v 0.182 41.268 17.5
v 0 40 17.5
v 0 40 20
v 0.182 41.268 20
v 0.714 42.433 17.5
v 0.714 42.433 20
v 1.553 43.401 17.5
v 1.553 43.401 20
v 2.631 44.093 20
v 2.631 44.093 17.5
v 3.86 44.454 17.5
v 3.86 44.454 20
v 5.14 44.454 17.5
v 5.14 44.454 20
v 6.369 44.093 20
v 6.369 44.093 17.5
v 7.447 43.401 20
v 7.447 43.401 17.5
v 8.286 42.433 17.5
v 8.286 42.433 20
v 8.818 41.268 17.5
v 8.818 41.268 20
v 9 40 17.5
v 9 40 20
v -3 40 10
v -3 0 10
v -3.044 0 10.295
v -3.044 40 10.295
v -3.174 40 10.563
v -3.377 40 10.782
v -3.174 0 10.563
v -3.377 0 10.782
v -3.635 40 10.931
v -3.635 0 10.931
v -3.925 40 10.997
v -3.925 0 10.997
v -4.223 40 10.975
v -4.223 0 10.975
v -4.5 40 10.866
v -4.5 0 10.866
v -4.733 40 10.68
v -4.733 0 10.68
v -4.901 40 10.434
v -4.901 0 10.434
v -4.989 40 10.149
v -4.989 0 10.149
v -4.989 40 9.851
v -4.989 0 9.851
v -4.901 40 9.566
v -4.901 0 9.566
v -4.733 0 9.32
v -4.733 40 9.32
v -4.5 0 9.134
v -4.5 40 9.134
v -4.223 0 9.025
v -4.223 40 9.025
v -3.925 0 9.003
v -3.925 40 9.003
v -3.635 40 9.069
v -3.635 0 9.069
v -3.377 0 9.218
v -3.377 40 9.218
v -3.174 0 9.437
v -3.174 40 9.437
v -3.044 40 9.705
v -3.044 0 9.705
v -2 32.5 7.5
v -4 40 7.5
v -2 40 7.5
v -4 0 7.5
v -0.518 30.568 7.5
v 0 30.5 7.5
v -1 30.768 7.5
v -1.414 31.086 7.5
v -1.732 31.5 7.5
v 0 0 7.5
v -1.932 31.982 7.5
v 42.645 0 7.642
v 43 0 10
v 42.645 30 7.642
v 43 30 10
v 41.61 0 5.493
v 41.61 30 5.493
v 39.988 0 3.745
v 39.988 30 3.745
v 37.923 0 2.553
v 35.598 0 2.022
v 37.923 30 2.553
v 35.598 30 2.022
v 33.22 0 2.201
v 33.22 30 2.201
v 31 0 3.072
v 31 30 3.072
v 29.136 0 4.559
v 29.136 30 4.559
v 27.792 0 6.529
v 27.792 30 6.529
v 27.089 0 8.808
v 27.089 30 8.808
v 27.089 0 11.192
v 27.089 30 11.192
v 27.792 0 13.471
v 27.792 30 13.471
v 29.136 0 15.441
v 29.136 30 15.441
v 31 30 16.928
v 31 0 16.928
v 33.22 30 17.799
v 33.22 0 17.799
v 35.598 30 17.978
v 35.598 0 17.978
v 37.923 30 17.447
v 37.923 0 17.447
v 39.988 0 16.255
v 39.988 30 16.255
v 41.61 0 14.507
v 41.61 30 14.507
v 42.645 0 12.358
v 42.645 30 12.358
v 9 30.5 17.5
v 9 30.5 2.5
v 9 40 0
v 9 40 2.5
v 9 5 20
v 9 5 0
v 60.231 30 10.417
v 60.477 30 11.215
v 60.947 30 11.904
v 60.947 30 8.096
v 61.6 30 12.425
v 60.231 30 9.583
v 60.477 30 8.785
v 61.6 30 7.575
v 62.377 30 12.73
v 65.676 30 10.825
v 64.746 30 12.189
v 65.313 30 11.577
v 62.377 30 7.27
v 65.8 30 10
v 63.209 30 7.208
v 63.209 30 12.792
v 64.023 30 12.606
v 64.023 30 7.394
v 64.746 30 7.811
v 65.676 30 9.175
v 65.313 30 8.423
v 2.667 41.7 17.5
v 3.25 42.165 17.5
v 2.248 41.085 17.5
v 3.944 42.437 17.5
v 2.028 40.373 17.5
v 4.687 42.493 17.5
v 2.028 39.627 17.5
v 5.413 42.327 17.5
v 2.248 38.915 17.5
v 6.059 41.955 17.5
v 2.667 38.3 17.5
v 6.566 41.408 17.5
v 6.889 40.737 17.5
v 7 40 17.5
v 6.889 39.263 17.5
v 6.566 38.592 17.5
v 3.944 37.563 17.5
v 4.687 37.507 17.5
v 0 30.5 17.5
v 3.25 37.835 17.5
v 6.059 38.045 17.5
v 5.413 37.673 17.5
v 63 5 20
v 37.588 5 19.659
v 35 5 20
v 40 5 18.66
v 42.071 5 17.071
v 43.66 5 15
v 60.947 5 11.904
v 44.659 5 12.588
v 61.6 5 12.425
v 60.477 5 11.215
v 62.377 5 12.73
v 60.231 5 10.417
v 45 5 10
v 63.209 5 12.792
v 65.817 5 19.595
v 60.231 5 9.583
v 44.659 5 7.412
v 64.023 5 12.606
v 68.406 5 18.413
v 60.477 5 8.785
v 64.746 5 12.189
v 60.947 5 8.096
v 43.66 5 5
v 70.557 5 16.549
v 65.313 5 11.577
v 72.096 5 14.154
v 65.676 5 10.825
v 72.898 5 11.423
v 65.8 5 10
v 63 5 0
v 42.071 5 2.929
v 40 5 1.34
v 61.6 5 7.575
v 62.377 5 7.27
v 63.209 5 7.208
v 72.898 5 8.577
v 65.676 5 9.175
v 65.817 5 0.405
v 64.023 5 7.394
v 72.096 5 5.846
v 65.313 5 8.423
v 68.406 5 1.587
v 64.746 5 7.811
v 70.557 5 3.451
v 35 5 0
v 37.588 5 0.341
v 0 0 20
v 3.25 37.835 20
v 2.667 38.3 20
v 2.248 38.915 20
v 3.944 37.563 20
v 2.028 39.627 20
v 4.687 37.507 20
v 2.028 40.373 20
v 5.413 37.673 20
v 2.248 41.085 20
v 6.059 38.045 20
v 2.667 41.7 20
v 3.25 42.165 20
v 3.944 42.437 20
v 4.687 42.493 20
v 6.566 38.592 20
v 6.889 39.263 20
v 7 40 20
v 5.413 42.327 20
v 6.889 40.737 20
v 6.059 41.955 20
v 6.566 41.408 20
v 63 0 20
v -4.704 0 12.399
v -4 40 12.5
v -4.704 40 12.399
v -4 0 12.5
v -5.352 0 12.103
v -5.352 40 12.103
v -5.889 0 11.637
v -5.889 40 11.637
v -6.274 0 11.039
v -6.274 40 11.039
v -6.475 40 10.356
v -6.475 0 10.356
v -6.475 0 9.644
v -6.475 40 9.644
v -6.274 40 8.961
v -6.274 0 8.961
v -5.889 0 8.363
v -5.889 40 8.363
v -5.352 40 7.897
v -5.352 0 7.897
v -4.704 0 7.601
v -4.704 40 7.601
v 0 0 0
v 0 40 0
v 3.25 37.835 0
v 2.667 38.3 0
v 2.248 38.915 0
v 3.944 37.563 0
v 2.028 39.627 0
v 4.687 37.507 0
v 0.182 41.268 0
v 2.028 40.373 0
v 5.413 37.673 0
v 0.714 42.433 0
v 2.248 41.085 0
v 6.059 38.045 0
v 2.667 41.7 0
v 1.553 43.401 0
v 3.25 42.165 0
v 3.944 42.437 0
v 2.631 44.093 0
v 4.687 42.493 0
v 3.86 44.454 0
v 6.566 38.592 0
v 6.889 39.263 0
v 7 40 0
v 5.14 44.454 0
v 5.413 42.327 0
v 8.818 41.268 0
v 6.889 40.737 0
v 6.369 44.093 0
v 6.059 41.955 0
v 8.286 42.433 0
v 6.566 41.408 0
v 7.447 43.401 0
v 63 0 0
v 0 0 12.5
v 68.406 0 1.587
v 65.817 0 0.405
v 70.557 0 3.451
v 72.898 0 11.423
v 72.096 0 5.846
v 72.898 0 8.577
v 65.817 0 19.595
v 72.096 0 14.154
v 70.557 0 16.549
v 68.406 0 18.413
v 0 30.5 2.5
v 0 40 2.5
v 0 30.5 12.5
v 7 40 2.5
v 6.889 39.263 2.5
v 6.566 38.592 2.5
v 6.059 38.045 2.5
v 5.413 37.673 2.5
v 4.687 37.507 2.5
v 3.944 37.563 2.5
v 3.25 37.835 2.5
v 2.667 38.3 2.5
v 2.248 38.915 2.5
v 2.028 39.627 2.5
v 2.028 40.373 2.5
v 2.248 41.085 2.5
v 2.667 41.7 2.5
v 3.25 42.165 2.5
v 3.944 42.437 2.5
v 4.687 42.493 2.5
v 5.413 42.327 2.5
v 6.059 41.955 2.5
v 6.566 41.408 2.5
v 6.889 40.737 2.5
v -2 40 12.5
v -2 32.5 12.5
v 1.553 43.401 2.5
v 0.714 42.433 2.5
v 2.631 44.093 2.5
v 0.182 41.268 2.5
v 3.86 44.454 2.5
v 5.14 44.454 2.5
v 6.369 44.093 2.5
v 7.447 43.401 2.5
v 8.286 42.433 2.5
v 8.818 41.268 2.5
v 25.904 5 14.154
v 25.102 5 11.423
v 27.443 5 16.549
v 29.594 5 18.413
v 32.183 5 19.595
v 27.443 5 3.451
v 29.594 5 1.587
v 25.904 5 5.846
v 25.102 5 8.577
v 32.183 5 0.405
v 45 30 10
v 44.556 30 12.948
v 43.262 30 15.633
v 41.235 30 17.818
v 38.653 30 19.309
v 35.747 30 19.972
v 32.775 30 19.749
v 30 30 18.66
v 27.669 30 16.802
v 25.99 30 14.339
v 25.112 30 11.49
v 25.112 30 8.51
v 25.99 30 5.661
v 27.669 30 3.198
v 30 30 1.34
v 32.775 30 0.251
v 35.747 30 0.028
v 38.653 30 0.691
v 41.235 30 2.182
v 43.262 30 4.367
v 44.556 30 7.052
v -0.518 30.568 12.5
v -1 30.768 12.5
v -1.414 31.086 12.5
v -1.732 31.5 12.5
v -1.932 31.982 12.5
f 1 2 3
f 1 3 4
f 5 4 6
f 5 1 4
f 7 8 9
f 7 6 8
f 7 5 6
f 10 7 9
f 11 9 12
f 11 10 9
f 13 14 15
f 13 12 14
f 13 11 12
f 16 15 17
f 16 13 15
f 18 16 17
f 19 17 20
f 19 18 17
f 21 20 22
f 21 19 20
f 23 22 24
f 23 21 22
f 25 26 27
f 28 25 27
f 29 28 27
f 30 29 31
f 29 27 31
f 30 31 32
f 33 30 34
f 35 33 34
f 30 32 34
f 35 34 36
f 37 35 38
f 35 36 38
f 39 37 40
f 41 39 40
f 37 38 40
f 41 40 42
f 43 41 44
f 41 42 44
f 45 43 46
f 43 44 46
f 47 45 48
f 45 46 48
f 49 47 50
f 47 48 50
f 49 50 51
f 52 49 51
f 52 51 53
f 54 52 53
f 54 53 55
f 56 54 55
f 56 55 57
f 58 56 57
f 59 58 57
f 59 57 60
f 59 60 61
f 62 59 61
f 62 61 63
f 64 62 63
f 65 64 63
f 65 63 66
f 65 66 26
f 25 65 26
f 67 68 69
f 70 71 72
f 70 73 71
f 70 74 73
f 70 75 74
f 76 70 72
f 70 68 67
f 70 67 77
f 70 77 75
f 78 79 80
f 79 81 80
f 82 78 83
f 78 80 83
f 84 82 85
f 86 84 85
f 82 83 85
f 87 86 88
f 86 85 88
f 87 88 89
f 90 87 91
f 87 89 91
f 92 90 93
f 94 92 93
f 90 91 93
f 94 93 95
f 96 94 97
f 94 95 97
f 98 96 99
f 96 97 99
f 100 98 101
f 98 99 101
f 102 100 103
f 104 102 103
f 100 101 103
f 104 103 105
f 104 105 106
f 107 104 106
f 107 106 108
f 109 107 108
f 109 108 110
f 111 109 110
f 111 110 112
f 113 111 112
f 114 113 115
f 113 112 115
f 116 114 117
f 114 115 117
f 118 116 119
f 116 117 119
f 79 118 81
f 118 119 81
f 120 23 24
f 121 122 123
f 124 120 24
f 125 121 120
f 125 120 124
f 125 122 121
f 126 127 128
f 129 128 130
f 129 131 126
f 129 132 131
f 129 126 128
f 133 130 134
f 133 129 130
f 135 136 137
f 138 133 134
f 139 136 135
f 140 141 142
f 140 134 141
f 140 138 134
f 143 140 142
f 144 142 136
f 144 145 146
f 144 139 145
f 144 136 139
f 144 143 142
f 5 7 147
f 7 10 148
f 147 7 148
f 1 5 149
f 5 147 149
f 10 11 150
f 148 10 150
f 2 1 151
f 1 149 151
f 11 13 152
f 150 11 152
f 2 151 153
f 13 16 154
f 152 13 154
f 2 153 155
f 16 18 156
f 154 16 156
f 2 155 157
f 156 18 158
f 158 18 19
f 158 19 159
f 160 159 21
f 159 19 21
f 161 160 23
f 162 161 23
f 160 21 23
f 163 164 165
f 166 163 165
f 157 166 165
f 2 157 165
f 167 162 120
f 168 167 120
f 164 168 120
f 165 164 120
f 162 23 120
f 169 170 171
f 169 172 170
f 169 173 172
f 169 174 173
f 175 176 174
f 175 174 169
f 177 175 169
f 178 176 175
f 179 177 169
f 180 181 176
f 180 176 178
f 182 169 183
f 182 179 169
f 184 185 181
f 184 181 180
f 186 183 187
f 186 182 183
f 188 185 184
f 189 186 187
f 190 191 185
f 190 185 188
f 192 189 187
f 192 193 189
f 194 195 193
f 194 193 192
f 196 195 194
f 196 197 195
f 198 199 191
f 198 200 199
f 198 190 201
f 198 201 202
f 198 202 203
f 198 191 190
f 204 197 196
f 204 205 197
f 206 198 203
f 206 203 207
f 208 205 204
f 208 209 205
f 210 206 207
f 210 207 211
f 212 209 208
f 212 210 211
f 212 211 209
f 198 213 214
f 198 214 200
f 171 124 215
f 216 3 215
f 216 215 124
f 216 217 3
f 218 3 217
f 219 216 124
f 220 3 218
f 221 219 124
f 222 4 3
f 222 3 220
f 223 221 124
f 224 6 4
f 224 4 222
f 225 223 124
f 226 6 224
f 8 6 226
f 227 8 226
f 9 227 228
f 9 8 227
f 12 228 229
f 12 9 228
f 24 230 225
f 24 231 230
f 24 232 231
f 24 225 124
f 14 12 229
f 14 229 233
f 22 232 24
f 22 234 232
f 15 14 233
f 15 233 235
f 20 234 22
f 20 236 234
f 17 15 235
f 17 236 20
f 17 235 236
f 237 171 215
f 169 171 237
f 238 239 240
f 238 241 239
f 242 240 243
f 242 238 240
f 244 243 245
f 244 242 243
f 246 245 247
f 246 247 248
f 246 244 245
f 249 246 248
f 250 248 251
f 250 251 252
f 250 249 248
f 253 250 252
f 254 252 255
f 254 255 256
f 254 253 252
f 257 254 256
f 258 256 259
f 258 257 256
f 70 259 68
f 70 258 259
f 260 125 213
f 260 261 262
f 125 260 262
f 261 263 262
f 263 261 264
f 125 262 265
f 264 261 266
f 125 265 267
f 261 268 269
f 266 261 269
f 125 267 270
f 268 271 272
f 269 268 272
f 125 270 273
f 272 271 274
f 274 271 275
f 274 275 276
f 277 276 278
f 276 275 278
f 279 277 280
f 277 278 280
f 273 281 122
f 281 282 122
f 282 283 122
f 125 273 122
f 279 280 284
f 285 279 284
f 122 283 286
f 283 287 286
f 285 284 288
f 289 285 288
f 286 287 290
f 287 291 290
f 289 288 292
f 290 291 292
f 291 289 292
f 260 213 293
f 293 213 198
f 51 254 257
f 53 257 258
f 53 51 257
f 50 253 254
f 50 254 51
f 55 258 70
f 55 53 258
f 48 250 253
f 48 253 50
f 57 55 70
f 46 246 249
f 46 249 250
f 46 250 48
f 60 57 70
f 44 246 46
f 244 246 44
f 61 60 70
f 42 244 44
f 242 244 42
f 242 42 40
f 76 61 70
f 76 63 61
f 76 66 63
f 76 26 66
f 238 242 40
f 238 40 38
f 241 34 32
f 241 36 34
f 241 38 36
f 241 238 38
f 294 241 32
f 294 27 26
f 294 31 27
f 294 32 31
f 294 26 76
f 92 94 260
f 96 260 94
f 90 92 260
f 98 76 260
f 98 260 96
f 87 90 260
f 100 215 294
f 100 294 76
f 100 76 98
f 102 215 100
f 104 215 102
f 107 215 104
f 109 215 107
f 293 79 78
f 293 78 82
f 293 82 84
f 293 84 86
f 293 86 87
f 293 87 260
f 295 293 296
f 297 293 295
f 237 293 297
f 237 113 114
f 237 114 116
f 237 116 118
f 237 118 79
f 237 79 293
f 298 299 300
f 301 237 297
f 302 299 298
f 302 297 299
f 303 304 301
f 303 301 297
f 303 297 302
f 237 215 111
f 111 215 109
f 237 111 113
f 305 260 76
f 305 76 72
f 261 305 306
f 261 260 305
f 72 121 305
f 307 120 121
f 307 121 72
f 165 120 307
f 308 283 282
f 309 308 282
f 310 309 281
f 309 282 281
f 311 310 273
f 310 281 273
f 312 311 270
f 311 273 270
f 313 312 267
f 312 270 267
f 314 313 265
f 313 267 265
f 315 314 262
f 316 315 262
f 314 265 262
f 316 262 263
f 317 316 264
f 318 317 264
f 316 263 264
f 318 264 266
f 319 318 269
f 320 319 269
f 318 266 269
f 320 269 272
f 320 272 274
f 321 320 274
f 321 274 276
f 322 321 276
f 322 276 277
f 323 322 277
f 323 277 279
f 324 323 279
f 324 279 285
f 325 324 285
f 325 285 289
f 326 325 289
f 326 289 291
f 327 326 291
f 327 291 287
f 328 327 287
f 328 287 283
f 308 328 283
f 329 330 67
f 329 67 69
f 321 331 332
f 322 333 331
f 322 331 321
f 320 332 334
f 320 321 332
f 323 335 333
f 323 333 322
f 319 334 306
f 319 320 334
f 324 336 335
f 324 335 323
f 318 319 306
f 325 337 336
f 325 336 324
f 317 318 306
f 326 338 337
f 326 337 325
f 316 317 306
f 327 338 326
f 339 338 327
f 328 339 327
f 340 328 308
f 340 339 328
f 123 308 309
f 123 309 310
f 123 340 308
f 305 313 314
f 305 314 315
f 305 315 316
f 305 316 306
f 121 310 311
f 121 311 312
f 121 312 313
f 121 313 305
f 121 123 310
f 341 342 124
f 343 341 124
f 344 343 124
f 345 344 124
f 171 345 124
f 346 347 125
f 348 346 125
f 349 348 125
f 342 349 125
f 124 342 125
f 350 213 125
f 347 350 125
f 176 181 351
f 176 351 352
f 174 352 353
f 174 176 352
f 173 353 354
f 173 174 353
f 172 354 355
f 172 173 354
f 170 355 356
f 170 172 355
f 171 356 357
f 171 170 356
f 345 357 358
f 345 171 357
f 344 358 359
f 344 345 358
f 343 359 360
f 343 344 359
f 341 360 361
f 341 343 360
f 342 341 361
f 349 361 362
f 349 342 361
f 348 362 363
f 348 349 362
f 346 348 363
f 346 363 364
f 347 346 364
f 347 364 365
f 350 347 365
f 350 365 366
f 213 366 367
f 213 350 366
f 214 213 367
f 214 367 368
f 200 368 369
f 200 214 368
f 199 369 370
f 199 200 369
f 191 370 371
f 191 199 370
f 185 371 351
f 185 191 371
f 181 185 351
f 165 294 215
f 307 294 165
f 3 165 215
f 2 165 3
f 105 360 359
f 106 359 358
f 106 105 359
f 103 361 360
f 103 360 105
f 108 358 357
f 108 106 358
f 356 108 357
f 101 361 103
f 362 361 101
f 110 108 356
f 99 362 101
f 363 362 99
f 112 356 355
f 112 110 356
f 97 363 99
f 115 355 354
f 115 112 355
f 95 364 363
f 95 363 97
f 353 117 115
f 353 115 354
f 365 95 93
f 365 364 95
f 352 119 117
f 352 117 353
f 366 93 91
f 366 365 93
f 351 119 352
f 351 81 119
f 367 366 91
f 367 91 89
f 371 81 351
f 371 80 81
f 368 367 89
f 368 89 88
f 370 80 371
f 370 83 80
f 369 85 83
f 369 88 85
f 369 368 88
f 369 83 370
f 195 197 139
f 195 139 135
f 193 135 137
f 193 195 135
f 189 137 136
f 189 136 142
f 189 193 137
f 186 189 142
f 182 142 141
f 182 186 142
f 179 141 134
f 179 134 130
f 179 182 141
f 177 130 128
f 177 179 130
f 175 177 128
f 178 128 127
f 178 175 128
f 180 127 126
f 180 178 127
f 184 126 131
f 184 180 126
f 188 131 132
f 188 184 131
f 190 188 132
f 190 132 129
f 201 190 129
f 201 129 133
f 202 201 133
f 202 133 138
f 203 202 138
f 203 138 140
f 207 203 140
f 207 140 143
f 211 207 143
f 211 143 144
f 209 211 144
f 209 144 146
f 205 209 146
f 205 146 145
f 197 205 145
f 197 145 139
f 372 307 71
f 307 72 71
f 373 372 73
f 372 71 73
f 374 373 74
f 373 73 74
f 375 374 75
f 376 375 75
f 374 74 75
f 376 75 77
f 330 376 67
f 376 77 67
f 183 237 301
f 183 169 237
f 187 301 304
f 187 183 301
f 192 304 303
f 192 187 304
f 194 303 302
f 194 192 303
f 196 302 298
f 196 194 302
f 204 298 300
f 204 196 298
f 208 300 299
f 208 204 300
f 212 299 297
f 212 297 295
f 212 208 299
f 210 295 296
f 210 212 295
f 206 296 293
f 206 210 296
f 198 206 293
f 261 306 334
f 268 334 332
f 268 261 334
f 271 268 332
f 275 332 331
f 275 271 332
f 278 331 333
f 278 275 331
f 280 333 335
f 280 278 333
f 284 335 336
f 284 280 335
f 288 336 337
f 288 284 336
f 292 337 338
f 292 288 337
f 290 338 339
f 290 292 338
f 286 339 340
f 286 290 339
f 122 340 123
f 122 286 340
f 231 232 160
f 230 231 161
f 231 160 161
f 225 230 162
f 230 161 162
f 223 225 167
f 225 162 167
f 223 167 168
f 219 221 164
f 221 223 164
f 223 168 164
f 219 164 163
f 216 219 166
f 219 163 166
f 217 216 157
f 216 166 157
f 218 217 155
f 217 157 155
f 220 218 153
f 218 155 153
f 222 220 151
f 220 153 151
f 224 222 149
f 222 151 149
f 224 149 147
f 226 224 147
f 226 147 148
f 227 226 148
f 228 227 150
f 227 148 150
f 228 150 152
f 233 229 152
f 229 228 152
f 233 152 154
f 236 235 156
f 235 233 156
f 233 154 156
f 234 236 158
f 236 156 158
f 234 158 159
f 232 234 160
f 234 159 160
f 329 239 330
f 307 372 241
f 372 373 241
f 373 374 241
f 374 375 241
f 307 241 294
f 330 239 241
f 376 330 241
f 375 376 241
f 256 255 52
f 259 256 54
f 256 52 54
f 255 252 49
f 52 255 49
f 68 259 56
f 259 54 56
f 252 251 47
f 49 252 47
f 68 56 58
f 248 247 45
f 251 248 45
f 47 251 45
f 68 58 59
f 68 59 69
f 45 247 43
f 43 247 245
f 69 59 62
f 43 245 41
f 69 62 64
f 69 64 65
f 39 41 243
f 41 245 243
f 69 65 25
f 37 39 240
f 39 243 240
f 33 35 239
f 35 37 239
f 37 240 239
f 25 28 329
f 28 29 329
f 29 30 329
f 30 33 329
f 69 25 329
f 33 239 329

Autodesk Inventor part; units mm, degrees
ref_plane "YZ Plane" through (0, 0, 0) normal (1, 0, 0) x (0, 1, 0)
ref_plane "XZ Plane" through (0, 0, 0) normal (0, 1, 0) x (-1, 0, 0)
ref_plane "XY Plane" through (0, 0, 0) normal (0, 0, 1) x (1, 0, 0)
sketch "Sketch1" plane through (0, 0, 0) normal (0, 0, 1) x (1, 0, 0)
  line L0 (0, 0) -> (0, 40)
  line L1 (0, 0) -> (63, 0)
  line L2 (63, 0) -> (63, 5)
  line L3 (63, 5) -> (9, 5)
  arc A0 (9, 40) -> (0, 40) centre (4.5, 40) ccw
  line L4 (9, 40) -> (9, 5)
  circle A1 centre (4.5, 40) radius 2.5
  dimension "d0" = 40
  dimension "d2" = 5
  dimension "d6" = 4.5
  dimension "d7" = 5
  dimension "d8" = 9
  dimension "d9" = 54
  dimension "d47" = 32.5
extrude "Extrusion1" add sketch "Sketch1" along normal blind 20
sketch "Sketch2" plane through (9, 5, 0) normal (0, 1, 0) x (1, 0, 0)
  line L0 (0, 0) -> (0, -20) projected
  circle A0 centre (26, -10) radius 10
  line L1 (0, 0) -> (54, 0) projected
  circle A1 centre (54, -10) radius 2.8
  line L2 (54, 0) -> (54, -20) projected
  point P0 (-9, 0)
  dimension "d14" = 20
  dimension "d16" = 26
  dimension "d20" = 5.6
  dimension "d21" = 10
  dimension "d22" = 15.2
  dimension "d67" = 0
sketch "Sketch7" plane through (9, 5, 0) normal (1, 0, 0) x (0, 0, -1)
  line L0 (-10, 41.0364) -> (-10, 39.6436)
  line L1 (0, 39.5) -> (-20, 39.5) projected
  line L2 (-2.5, 39.5) -> (-2.5, 25.5)
  line L3 (-17.5, 39.5) -> (-17.5, 25.5)
  line L4 (-17.5, 39.5) -> (-2.5, 39.5)
  line L5 (0, 32.5) -> (-20, 32.5) projected
  line L6 (-17.5, 25.5) -> (-2.5, 25.5)
  point P0 (0, -5)
  dimension "d40" = 14
  dimension "d41" = 14
  dimension "d42" = 15
extrude "Extrusion5" cut sketch "Sketch7" against normal blind 14
extrude "Extrusion6" add sketch "Sketch2" along normal blind 25
sketch "Sketch9" plane through (35, 30, 10) normal (0, 1, 0) x (1, 0, 0)
  circle A0 centre (0, 0) radius 8
  point P0 (-35, 10)
  dimension "d50" = 16
extrude "Extrusion7" cut sketch "Sketch9" against normal blind 31
sketch "Sketch12" plane through (35, 5, 0) normal (0, 1, 0) x (1, 0, 0)
  line L0 (28, 0) -> (28, -20) projected
  arc A0 (28, -20) -> (28, 0) centre (28, -10) ccw
  line L1 (28, 0) -> (-35, 0) projected
  line L2 (28, 0) -> (28, -20)
extrude "Extrusion10" add sketch "Sketch12" against normal blind 5
sketch "Sketch13" plane through (0, 0, 0) normal (0, -1, 0) x (1, 0, 0)
  circle A0 centre (-4, 10) radius 1
  line L0 (-4, 12.5) -> (0, 12.5)
  line L1 (0, 0) -> (0, 20) projected
  line L2 (-4, 7.5) -> (0, 7.5)
  arc A1 (-4, 12.5) -> (-4, 7.5) centre (-4, 10) ccw
  line L3 (0, 7.5) -> (0, 12.5)
  line L4 (63, 0) -> (0, 0) projected
  line L5 (0, 20) -> (63, 20) projected
  dimension "d68" = 2
  dimension "d72" = 4
  dimension "d73" = 10
  dimension "d74" = 20
extrude "Extrusion11" add sketch "Sketch13" against normal blind 40
sketch "Sketch14" plane through (-4, 0, 12.5) normal (0, 0, 1) x (1, 0, 0)
  line L0 (0, 40) -> (4, 40) projected
  line L1 (13, 30.5) -> (4, 30.5) projected
  line L2 (4, 40) -> (4, 30.5)
  line L3 (4, 30.5) -> (2, 30.5)
  line L4 (2, 30.5) -> (2, 40)
  line L5 (2, 40) -> (4, 40)
  point P0 (4, 0)
  dimension "d75" = 2
extrude "Extrusion12" cut sketch "Sketch14" against normal up to surface (5 mm away)
fillet "Fillet4" radius 2 1 edges at (-2, 30.5, 10)
equation "\"d21\" = d19"
equation "\"d40\" = d41"
equation "\"d73\" = 0.5 * d74"
equation "\"d19\" = 0.5 * d14"
properties part number "ValveBaseMk2.5"
